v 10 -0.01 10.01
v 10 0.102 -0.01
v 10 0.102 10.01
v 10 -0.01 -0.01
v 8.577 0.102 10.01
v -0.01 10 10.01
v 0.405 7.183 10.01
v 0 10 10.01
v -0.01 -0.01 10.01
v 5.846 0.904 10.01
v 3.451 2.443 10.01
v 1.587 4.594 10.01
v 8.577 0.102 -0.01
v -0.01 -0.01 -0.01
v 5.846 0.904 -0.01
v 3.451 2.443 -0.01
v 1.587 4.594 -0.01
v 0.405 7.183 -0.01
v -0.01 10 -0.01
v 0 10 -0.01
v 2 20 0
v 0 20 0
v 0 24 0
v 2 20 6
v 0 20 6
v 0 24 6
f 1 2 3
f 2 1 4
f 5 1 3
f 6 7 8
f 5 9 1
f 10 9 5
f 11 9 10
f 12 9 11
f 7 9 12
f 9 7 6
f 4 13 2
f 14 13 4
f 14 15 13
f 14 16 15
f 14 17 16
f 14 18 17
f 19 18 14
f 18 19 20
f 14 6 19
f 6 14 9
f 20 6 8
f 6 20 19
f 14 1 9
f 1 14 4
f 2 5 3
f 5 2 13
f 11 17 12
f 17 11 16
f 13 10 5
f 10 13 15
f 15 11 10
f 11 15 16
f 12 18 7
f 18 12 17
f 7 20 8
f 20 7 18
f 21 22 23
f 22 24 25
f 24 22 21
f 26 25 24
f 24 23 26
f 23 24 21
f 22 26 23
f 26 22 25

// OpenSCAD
//======================================================================
// rounder.scad
//
// cutting tools for rounding off corners and making bevels
//
// DrTomFlint 26 March 2024
//======================================================================


//----------------------------------------------------------------------
module rounder(
r=10,   // radius
h=10,   // height
f=22,    // $fn
extra=0.01  // extra size for the cube to ensure a clean cut
){

difference(){
  translate([-extra,-extra,-extra])
  cube([r+extra,r+extra,h+2*extra]);
  translate([r,r,-1])
  cylinder(r=r,h=h+2,$fn=f);
}

}

//----------------------------------------------------------------------
module bevel(x=1,y=1,h=10){

linear_extrude(height=h)
polygon(points=[[0,0],[x,0],[0,y]]);
    
}
  
//======================================================================
// call the two modules as a demo, these are not printed on their own
// just used to make cuts and fillets

rounder();

translate([0,20,0])
bevel(x=2,y=4,h=6);

//======================================================================
